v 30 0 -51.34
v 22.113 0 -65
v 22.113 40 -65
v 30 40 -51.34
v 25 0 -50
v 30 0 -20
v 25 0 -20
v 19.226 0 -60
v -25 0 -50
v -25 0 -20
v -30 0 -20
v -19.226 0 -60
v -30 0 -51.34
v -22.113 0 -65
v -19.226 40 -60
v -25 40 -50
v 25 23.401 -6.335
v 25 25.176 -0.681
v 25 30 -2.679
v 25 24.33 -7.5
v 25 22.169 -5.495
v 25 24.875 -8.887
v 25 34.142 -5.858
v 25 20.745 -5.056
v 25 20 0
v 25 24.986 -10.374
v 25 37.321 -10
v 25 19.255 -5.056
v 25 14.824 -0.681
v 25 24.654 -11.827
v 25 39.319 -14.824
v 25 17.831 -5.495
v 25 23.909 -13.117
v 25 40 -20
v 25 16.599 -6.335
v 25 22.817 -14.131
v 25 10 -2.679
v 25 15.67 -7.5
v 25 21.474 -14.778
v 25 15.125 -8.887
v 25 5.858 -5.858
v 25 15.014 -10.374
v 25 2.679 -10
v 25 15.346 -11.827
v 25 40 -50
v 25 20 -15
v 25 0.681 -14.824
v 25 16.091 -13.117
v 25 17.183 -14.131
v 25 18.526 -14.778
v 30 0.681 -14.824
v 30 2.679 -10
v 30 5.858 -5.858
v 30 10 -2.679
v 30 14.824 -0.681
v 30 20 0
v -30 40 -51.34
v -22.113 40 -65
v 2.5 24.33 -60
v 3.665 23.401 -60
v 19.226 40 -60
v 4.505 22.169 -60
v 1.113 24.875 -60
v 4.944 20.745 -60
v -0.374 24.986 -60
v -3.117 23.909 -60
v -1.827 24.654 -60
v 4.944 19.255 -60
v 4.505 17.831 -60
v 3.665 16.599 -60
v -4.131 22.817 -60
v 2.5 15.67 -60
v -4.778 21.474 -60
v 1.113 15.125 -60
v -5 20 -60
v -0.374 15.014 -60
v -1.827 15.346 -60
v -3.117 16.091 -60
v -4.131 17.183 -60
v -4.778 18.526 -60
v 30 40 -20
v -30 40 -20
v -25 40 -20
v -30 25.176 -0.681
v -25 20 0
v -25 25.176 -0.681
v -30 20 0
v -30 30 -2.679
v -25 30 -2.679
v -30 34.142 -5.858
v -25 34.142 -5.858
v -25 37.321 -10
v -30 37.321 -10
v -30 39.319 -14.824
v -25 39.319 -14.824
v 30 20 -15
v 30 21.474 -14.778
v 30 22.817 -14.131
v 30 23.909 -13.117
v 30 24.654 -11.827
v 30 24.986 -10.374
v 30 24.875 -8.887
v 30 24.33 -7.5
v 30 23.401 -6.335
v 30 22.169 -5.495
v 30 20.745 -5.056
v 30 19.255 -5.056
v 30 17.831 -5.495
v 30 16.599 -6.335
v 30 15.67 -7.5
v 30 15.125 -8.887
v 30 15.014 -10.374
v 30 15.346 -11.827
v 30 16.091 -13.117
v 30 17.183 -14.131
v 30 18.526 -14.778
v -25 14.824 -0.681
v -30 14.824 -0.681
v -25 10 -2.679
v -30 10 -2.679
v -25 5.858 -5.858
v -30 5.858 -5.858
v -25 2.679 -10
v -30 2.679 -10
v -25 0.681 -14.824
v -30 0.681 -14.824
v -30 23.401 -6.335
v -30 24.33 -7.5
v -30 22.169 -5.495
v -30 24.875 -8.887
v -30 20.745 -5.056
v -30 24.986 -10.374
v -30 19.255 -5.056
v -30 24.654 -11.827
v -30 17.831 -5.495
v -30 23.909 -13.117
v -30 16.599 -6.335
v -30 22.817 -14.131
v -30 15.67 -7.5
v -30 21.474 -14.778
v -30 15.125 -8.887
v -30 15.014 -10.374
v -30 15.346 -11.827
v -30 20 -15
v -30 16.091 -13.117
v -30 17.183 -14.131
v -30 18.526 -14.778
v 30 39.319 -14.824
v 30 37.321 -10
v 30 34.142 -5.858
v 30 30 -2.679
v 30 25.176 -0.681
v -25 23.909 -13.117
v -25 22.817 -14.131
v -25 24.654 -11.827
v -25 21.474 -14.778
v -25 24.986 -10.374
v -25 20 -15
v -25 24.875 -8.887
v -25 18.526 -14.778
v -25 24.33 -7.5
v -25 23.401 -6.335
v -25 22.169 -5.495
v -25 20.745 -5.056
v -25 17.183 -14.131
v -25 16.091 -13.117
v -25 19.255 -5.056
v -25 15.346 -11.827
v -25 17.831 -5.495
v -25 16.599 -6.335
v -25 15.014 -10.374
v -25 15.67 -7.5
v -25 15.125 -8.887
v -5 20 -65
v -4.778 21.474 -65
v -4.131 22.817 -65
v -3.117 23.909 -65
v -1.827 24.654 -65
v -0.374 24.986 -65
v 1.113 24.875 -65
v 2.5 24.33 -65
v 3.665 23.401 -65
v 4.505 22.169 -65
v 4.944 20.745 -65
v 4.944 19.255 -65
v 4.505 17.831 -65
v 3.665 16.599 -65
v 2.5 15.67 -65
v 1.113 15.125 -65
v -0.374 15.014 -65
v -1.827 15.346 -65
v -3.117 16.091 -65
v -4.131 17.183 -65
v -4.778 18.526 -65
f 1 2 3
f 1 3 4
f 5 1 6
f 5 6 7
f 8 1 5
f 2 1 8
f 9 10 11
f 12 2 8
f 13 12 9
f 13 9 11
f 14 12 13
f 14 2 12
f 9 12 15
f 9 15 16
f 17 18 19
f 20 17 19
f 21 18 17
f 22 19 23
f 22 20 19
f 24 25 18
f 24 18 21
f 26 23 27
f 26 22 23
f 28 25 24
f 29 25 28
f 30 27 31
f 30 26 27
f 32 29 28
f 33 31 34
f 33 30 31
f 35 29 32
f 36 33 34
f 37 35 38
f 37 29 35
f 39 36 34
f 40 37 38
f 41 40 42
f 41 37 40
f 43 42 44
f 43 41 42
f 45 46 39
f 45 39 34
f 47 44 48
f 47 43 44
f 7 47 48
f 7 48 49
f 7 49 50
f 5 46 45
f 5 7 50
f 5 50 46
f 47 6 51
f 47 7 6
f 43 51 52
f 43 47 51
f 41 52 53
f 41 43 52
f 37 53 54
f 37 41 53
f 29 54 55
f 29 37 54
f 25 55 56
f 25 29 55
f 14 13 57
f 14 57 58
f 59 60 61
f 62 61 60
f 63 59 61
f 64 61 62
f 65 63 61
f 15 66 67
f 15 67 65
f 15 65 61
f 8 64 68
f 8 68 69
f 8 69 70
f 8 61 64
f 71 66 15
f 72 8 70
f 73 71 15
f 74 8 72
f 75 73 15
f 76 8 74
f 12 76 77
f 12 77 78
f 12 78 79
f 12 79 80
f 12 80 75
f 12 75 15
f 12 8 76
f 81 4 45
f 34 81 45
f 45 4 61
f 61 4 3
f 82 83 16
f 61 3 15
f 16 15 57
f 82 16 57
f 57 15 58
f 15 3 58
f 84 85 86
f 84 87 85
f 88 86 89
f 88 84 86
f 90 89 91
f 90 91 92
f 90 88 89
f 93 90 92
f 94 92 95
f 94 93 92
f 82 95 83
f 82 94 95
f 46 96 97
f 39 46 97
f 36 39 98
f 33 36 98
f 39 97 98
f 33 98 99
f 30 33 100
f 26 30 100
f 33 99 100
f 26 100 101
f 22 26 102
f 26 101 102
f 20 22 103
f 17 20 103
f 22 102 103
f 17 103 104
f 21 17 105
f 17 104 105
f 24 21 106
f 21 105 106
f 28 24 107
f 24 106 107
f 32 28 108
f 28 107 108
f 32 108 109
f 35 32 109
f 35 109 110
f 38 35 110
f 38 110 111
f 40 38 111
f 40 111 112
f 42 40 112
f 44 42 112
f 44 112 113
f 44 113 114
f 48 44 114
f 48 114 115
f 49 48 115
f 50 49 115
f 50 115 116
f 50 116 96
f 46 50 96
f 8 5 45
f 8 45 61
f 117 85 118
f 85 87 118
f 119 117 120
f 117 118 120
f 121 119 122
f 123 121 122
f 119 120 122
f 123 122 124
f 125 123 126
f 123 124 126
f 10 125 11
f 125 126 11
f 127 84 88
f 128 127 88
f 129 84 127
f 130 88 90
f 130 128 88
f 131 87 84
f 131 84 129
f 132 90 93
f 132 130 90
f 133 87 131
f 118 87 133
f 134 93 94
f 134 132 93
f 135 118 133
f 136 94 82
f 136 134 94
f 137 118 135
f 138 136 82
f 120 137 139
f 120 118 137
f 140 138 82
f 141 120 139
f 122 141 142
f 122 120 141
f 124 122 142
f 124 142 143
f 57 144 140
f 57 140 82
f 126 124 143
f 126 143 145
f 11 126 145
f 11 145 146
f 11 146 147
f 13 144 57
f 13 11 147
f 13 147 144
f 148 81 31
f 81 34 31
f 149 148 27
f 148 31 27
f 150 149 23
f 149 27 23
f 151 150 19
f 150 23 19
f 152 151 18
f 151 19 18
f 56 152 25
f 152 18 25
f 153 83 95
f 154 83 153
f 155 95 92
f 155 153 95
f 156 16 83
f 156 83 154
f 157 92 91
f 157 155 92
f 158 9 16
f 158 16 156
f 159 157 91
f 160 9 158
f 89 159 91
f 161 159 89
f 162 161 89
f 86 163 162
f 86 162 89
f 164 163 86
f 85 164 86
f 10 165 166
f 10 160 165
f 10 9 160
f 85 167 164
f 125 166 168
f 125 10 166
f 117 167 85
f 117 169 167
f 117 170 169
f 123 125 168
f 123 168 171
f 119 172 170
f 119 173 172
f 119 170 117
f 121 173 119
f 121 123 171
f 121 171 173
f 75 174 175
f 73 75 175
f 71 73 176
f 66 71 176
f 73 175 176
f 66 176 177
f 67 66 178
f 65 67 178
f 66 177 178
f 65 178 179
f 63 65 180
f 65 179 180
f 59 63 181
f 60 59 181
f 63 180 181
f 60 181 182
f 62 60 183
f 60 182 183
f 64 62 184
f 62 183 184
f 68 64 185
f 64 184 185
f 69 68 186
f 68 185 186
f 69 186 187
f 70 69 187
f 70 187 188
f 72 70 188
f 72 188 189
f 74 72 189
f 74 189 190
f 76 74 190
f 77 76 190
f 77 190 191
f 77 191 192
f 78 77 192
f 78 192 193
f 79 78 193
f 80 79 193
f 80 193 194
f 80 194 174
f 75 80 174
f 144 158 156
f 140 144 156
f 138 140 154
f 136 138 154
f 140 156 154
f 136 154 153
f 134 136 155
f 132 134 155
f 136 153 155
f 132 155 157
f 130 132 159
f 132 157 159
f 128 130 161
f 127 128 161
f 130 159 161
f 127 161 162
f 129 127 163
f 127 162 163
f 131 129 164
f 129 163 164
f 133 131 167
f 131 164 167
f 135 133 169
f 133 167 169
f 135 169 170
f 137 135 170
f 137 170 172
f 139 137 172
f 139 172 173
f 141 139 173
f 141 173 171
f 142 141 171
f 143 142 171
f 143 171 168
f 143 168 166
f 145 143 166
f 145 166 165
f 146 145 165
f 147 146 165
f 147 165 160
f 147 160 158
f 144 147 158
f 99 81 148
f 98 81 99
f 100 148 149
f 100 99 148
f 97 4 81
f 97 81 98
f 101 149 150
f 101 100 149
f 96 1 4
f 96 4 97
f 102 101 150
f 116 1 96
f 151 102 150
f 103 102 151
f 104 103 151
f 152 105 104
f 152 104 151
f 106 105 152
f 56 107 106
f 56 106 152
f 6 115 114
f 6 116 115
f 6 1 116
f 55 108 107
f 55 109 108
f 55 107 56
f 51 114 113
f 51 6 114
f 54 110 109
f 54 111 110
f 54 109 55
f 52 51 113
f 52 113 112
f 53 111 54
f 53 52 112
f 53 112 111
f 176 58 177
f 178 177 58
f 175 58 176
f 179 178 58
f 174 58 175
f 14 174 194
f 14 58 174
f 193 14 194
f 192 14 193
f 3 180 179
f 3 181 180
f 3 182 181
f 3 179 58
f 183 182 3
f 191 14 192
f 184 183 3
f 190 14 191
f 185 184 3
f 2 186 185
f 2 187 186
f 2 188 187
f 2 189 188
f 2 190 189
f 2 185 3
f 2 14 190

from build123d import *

# Parameters (mm, degrees)
BOSS_EXTRUDE1_DEPTH = 40
SKETCH3_R           = 5
CUT_EXTRUDE1_DEPTH  = 98.082439195
FILLET1_R           = 20
CUT_EXTRUDE2_REACH  = 84.006
SKETCH4_R           = 5


with BuildPart() as part:
    # Sketch2 → Boss-Extrude1 (new body)
    with BuildSketch(Plane(origin=(0, 0, 0), x_dir=(1, 0, 0), z_dir=(0, 1, 0))):
        Polygon((-30, 0), (-30, 51.339745962), (-22.113248654, 65), (22.113248654, 65), (30, 51.339745962), (30, 0), (25, 0), (25, 50), (19.226497308, 60), (-19.226497308, 60), (-25, 50), (-25, 0), align=None)
    extrude(amount=BOSS_EXTRUDE1_DEPTH)

    # Sketch3 → Cut-Extrude1 (cut, through all)
    with BuildSketch(Plane(origin=(30, 0, 0), x_dir=(0, 0, -1), z_dir=(1, 0, 0))):
        with Locations((10, 20)):
            Circle(SKETCH3_R)
    extrude(amount=-CUT_EXTRUDE1_DEPTH, mode=Mode.SUBTRACT)

    # Fillet1
    fillet1_edges = [part.edges().sort_by_distance(p)[0] for p in [
        (27.5, 40, 0),
        (-27.5, 40, 0),
        (-27.5, 0, 0),
        (27.5, 0, 0),
    ]]
    fillet(fillet1_edges, radius=FILLET1_R - 0.0001)  # a hair under: the kernel refuses the full size

    # Sketch4 → Cut-Extrude2 (cut, up to next)
    with BuildSketch(Plane(origin=(0, 0, -65), x_dir=(-1, 0, 0), z_dir=(0, 0, -1)), mode=Mode.PRIVATE) as cut_extrude2_sk1:
        with Locations((0, 20)):
            Circle(SKETCH4_R)
    cut_extrude2_tool1 = extrude(cut_extrude2_sk1.sketch, amount=-CUT_EXTRUDE2_REACH, mode=Mode.PRIVATE) & part.part
    add(cut_extrude2_tool1.solids().sort_by_distance((0, 20, -65))[0], mode=Mode.SUBTRACT)


solid = part.part
